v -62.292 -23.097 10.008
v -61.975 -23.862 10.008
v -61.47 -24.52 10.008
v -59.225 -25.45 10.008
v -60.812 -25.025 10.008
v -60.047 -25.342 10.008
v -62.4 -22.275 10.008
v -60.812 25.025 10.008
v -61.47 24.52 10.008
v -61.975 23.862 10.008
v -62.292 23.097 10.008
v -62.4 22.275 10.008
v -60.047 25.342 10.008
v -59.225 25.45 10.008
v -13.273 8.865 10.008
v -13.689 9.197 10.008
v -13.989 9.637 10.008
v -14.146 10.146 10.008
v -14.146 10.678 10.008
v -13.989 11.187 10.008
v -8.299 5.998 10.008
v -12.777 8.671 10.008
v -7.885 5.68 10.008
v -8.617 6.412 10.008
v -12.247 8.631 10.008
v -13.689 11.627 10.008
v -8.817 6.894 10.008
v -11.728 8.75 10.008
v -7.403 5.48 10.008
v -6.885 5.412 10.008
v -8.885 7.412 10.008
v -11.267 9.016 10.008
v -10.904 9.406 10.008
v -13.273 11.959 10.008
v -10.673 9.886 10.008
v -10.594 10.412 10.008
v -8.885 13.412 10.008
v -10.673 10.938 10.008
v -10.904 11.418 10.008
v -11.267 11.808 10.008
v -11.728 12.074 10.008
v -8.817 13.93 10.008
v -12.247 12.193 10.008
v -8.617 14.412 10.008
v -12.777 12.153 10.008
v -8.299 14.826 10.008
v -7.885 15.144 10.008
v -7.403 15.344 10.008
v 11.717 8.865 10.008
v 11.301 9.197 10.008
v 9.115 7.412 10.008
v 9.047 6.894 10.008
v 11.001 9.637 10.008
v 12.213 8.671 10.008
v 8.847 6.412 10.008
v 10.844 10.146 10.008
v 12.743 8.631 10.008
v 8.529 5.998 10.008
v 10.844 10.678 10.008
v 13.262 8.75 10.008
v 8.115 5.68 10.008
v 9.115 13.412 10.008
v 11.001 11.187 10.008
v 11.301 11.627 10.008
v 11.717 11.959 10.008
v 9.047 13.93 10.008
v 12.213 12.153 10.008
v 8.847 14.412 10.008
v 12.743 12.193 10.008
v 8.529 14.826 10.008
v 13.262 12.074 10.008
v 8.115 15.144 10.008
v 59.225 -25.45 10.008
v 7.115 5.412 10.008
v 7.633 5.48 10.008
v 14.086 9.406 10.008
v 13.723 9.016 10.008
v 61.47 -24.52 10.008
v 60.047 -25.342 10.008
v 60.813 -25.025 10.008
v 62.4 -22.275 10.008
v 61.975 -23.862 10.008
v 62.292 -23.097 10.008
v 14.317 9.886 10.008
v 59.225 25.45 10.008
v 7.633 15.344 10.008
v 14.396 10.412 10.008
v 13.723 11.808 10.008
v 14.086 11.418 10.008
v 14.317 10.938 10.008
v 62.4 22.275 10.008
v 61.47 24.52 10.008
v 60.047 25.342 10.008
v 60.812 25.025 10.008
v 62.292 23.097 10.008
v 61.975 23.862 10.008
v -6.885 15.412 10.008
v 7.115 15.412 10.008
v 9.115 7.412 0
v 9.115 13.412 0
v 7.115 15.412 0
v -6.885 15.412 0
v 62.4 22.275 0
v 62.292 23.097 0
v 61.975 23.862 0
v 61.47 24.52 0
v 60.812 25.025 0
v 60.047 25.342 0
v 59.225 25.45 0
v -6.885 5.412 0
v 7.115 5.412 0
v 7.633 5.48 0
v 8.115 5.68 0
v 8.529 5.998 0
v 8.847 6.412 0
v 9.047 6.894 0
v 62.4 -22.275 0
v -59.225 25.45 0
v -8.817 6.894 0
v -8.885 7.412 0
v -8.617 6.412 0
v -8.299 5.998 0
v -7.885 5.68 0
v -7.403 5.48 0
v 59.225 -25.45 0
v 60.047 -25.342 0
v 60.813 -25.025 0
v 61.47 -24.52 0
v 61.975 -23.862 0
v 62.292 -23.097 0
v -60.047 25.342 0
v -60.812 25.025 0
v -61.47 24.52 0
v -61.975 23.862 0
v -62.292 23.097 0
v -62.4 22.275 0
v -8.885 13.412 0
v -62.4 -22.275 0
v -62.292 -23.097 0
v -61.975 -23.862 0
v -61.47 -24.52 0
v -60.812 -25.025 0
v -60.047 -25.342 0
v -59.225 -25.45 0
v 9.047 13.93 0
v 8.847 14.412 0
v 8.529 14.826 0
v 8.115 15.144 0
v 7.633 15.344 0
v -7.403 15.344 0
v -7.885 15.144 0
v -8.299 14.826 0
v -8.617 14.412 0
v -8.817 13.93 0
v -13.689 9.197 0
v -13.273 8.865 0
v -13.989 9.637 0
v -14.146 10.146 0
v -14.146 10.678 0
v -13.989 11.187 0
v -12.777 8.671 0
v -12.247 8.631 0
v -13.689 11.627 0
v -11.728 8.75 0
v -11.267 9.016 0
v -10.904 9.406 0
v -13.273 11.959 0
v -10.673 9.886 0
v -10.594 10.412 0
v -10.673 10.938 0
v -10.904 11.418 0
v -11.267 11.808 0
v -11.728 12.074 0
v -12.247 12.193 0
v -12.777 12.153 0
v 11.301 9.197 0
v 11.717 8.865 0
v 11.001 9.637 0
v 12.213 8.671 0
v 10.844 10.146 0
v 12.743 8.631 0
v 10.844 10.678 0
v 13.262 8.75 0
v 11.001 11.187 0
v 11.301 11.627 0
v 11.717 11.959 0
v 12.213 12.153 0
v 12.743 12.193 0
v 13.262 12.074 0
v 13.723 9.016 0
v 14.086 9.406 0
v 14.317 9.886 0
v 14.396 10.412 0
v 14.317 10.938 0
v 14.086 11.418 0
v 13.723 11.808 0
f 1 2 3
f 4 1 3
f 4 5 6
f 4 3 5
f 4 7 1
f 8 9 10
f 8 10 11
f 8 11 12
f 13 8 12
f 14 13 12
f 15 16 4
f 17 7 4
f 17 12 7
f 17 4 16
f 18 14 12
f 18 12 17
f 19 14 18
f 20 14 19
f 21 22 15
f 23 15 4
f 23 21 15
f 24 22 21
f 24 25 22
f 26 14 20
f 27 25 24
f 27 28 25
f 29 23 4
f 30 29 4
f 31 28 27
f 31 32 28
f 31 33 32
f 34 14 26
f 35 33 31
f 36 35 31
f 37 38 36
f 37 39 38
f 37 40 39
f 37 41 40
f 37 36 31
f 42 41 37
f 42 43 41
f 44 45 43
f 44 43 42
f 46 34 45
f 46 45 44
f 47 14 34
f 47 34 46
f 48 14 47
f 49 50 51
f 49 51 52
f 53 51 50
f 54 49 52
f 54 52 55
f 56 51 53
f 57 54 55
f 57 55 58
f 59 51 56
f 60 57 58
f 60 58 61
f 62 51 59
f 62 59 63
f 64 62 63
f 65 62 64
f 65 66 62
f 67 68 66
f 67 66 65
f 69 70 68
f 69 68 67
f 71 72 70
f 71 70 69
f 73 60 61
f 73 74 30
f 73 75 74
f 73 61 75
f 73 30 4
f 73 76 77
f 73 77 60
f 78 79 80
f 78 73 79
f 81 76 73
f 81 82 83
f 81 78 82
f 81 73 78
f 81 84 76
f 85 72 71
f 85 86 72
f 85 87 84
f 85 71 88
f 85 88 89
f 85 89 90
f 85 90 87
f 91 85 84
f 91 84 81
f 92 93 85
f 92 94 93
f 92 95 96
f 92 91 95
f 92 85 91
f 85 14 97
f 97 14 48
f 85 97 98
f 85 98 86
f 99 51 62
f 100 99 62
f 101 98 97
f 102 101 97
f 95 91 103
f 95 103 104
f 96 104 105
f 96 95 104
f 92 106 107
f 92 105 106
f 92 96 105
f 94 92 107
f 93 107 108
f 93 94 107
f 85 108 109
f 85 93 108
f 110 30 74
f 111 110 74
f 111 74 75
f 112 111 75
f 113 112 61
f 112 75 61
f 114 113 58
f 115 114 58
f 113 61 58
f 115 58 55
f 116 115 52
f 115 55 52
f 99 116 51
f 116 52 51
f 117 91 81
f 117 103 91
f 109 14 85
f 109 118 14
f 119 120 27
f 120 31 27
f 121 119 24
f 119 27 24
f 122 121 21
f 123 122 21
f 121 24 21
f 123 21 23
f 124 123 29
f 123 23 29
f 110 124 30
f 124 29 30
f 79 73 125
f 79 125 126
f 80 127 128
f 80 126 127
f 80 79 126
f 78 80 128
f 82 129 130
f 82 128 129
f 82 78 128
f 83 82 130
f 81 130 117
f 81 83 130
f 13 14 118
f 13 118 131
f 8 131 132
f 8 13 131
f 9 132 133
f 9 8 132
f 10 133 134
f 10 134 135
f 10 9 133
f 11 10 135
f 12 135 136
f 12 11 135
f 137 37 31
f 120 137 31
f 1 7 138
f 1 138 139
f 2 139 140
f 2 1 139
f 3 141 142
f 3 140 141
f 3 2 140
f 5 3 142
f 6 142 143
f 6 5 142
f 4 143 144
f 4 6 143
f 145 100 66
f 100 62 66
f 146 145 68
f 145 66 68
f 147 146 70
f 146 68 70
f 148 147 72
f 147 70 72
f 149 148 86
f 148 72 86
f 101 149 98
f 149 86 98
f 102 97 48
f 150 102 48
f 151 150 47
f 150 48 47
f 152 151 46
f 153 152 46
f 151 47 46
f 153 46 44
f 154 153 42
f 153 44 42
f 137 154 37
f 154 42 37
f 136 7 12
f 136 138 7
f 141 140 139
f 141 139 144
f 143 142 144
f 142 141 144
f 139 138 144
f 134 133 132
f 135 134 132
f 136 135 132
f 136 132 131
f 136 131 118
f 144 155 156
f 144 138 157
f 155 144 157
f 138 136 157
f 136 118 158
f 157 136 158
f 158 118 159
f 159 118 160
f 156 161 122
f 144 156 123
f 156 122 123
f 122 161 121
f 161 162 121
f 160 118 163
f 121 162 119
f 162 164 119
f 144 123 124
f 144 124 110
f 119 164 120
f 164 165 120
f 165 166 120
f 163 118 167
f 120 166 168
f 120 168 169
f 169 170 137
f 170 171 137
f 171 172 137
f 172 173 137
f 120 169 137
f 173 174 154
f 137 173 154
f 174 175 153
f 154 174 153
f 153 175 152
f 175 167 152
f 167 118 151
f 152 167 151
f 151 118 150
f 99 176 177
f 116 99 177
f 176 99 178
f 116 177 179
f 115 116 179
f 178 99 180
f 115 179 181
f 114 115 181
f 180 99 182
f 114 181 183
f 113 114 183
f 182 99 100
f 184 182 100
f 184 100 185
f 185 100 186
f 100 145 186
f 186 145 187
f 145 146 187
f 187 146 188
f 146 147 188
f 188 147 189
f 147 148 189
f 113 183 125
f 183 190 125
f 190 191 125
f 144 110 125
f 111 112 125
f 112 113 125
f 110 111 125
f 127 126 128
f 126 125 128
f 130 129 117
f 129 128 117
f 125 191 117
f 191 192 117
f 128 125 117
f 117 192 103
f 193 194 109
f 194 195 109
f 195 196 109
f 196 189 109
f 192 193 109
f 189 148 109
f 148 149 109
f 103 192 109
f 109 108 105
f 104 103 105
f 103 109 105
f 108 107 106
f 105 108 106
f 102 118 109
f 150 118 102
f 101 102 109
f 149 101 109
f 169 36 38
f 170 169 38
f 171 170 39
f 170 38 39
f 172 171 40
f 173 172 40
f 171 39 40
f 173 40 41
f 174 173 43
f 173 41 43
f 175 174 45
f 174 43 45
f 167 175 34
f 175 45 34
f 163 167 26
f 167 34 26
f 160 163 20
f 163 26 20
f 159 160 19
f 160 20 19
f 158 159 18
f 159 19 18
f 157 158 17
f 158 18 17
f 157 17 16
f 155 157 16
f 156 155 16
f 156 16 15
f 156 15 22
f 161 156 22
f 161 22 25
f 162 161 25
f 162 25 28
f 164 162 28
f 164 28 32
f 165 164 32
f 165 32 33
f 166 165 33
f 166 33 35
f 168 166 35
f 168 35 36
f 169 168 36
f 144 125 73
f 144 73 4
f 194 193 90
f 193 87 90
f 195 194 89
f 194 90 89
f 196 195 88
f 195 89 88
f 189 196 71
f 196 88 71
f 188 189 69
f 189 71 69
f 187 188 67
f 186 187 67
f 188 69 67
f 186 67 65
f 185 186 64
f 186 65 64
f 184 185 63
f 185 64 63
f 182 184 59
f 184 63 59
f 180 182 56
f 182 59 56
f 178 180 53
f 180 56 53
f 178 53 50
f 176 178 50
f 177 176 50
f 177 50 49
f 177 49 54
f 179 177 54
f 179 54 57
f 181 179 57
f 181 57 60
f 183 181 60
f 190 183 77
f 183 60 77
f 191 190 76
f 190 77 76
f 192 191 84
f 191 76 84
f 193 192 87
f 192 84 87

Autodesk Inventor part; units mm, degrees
ref_plane "YZ Plane" through (0, 0, 0) normal (1, 0, 0) x (0, 1, 0)
ref_plane "XZ Plane" through (0, 0, 0) normal (0, 1, 0) x (-1, 0, 0)
ref_plane "XY Plane" through (0, 0, 0) normal (0, 0, 1) x (1, 0, 0)
sketch "Sketch1" plane through (0, 0, 0) normal (0, 0, 1) x (1, 0, 0)
  line L0 (-62.4, 25.45) -> (62.4, 25.45)
  line L1 (62.4, 25.45) -> (62.4, -25.45)
  line L2 (62.4, -25.45) -> (-62.4, -25.45)
  line L3 (-62.4, -25.45) -> (-62.4, 25.45)
  point P0 (0, 0)
  dimension "d0" = 124.8
  dimension "d1" = 50.9
  dimension "d2" = 62.4
  dimension "d3" = 25.45
extrude "Extrusion1" add sketch "Sketch1" along normal blind 10.0076
fillet "Fillet1" radius 3.175 3 edges at (62.4, 25.45, 5.0038) (62.4, -25.45, 5.0038) (-62.4, -25.45, 5.0038)
fillet "Fillet2" radius 3.175 1 edges at (-62.4, 25.45, 5.0038)
sketch "Sketch5" plane through (0, 0, 10.0076) normal (0, 0, 1) x (1, 0, 0)
  line L0 (-8.885, 4.137) -> (9.115, 4.137) projected
  line L1 (9.115, 4.137) -> (9.115, 16.687) projected
  line L2 (9.115, 16.687) -> (-8.885, 16.687) projected
  line L3 (-8.885, 16.687) -> (-8.885, 4.137) projected
  circle A0 centre (-12.38, 10.412) radius 1.7859 projected
  circle A1 centre (12.61, 10.412) radius 1.7859 projected
  circle A2 centre (26.495, 9.117) radius 6.731 projected
  line L4 (2.175, 8.737) -> (14.175, 8.737) projected
  line L5 (14.175, 8.737) -> (14.175, 16.737) projected
  line L6 (14.175, 16.737) -> (2.175, 16.737) projected
  line L7 (2.175, 16.737) -> (2.175, 8.737) projected
  line L8 (2.175, 13.737) -> (2.175, 8.737) projected
  line L9 (2.175, 8.737) -> (14.175, 8.737) projected
  line L10 (14.175, 8.737) -> (14.175, 13.737) projected
  line L11 (14.175, 13.737) -> (2.175, 13.737) projected
  line L12 (47.045, 8.237) -> (63.045, 8.237) projected
  line L13 (63.045, 8.237) -> (63.045, 16.737) projected
  line L14 (63.045, 16.737) -> (47.045, 16.737) projected
  line L15 (47.045, 16.737) -> (47.045, 8.237) projected
  arc A3 (-8.885, 7.412) -> (-6.885, 5.412) centre (-6.885, 7.412) ccw projected
  line L16 (-8.885, 13.412) -> (-8.885, 7.412) projected
  arc A4 (-6.885, 15.412) -> (-8.885, 13.412) centre (-6.885, 13.412) ccw projected
  line L17 (7.115, 15.412) -> (-6.885, 15.412) projected
  arc A5 (9.115, 13.412) -> (7.115, 15.412) centre (7.115, 13.412) ccw projected
  line L18 (9.115, 7.412) -> (9.115, 13.412) projected
  arc A6 (7.115, 5.412) -> (9.115, 7.412) centre (7.115, 7.412) ccw projected
  line L19 (-6.885, 5.412) -> (7.115, 5.412) projected
  point P0 (0, 0)
extrude "Extrusion5" cut sketch "Sketch5" against normal up to surface (10.0076 mm away) contours L3 A4 L17 L7 L4 L1 A6 L19 A3 | L4 L7 L11 A5 L1 | L4 A1 | A1 L5 L4 | L17 A5 L11 L7 | A1 L5 | A0 picked at (13.0769, 10.2632)
equation "\"d2\" = 0.5 * d0"
equation "\"d3\" = 0.5 * d1"
properties part number "back cover"
